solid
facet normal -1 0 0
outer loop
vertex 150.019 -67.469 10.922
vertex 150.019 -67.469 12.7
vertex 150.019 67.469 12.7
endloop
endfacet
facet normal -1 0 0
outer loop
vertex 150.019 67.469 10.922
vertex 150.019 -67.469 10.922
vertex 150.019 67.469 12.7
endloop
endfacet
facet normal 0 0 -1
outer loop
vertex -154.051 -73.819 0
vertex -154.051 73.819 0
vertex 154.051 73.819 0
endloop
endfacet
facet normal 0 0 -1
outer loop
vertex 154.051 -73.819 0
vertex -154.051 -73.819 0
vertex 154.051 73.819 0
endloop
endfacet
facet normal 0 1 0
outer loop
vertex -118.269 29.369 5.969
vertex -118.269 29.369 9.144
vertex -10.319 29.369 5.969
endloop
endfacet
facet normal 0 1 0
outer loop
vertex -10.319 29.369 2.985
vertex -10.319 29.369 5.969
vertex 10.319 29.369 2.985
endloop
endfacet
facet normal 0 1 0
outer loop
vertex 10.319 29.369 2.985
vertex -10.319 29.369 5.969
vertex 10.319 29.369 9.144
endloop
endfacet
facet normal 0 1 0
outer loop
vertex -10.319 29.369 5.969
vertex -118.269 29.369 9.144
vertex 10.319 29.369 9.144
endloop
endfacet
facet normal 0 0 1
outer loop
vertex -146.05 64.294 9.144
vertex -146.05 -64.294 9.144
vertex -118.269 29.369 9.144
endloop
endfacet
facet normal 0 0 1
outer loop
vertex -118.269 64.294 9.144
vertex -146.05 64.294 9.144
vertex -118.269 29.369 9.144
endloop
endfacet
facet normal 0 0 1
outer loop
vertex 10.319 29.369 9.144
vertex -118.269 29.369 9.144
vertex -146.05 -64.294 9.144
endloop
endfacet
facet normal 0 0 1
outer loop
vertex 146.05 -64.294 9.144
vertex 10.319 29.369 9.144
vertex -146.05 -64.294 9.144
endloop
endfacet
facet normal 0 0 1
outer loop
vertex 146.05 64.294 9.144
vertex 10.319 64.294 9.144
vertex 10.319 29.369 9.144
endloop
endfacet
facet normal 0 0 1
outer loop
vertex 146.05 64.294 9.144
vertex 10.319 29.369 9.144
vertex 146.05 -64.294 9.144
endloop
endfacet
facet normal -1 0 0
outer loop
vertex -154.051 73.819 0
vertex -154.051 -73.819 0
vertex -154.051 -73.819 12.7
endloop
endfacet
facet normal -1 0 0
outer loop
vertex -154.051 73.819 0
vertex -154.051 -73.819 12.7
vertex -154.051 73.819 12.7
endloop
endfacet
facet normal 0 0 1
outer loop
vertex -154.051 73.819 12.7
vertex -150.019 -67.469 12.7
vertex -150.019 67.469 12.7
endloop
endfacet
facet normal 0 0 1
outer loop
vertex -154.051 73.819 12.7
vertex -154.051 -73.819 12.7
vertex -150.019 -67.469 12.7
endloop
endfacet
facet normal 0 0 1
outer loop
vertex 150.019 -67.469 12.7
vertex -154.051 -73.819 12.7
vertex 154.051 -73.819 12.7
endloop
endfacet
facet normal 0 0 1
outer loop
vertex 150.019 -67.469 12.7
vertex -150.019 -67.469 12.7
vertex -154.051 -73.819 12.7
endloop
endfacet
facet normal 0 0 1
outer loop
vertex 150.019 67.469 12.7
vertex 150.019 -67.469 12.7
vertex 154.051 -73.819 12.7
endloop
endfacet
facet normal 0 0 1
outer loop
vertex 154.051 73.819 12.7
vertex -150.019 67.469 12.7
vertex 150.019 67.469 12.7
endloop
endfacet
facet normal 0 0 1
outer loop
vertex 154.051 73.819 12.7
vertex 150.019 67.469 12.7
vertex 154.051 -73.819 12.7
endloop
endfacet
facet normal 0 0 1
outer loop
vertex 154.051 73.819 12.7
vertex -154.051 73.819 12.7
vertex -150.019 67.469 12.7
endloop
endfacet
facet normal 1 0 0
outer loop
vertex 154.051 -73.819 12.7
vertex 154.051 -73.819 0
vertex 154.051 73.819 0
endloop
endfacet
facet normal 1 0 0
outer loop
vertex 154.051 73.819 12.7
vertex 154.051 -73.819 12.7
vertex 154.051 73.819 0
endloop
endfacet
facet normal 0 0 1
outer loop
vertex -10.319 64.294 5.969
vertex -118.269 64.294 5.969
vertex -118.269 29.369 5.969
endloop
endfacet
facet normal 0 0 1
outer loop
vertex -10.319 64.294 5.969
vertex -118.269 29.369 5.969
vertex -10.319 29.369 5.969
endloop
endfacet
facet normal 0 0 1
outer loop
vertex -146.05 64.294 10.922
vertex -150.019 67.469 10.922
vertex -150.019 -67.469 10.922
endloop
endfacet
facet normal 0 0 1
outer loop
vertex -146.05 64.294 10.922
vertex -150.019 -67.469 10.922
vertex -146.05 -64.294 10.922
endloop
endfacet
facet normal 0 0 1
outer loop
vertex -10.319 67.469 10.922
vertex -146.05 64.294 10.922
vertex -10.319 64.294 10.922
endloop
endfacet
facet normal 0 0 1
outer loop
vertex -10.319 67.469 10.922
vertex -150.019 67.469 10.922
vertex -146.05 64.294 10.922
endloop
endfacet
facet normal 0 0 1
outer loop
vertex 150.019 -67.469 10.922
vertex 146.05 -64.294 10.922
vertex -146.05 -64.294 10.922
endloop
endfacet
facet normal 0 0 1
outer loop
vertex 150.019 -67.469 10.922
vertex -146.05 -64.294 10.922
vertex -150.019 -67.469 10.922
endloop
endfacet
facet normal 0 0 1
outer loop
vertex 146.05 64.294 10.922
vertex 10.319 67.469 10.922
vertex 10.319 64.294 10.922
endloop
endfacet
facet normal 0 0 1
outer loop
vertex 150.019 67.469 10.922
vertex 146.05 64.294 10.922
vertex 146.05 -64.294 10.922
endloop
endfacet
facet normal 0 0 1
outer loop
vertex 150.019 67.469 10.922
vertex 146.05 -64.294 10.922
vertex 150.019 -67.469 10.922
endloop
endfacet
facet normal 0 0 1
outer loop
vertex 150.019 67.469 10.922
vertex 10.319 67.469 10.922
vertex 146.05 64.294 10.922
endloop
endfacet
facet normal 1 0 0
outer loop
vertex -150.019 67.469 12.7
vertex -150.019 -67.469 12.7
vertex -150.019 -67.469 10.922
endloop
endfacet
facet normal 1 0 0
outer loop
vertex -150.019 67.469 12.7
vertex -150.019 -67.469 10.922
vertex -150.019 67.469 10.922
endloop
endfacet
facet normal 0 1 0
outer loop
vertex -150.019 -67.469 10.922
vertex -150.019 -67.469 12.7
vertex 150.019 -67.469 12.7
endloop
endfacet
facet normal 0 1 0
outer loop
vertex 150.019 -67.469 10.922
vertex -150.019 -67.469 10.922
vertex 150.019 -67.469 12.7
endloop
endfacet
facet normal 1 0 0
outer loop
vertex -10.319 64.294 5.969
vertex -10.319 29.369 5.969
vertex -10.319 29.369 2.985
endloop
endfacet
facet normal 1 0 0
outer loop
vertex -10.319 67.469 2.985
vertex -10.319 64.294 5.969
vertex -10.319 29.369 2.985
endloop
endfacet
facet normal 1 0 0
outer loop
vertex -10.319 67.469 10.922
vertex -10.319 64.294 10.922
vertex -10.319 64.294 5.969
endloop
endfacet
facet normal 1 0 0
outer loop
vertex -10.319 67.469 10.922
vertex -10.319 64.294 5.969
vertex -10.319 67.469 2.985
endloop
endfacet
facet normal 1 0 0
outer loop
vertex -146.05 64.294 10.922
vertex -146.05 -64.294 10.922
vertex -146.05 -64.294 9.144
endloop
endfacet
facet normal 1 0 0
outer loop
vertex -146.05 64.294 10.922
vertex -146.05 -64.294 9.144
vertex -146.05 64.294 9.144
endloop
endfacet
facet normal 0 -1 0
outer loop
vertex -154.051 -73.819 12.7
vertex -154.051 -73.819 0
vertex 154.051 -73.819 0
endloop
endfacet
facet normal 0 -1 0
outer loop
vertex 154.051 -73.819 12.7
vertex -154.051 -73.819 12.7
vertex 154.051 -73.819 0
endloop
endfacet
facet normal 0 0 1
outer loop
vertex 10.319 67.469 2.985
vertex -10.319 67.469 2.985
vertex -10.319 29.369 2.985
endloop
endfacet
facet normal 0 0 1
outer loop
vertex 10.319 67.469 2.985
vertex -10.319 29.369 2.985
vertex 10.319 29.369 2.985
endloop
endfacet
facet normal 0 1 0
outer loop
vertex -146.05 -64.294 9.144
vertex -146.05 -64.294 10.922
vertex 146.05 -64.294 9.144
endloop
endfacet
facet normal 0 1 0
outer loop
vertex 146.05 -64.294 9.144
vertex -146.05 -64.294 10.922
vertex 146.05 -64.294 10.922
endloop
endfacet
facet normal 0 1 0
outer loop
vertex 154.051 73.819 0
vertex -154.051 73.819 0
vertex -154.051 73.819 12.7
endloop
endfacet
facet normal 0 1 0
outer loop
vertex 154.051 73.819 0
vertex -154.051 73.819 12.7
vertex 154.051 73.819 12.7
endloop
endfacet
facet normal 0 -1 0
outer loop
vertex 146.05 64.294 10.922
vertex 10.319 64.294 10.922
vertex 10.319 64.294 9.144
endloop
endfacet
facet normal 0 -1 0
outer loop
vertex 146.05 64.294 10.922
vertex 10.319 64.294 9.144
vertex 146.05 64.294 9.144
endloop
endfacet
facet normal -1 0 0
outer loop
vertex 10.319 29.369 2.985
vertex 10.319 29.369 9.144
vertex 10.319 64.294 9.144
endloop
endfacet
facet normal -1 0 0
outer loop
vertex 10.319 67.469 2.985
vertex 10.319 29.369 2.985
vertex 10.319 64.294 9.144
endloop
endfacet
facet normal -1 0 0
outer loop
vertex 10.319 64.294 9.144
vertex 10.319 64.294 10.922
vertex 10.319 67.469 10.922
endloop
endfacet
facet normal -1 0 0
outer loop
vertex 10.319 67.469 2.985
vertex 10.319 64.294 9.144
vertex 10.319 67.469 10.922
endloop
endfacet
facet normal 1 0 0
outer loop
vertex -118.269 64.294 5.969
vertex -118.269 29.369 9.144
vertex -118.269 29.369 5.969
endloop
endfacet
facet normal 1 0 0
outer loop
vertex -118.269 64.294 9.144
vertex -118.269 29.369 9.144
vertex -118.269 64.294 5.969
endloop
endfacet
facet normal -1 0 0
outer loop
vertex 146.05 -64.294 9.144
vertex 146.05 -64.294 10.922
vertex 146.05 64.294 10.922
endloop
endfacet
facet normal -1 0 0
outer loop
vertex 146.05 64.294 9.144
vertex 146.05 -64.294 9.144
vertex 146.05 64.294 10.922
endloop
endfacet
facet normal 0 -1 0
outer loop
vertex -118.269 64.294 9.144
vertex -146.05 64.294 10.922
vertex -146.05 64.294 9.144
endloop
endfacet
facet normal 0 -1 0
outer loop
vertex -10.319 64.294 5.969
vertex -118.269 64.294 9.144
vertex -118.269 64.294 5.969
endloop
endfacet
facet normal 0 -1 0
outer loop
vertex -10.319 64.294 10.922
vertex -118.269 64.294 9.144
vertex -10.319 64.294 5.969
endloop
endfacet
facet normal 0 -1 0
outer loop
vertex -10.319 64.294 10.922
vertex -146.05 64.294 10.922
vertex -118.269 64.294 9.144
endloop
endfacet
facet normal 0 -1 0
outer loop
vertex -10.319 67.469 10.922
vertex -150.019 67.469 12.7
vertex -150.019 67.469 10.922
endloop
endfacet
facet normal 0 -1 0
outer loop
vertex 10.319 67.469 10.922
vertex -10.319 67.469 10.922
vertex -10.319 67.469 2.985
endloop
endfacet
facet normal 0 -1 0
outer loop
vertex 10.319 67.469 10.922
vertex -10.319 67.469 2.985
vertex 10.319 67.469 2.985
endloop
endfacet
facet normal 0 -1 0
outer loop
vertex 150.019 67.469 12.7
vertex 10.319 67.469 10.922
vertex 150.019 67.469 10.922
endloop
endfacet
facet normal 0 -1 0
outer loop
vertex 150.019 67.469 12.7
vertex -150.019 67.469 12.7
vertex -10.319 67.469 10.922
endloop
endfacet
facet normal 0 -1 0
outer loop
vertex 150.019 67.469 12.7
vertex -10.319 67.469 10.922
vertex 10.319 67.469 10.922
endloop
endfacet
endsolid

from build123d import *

# Parameters (mm, degrees)
SKETCH001_W     = 308.102
SKETCH001_H     = 147.6375
PAD_DEPTH       = 12.7
SKETCH002_W     = 292.1
SKETCH002_H     = 128.5875
POCKET_DEPTH    = 3.556
SKETCH_W        = 300.0375
SKETCH_H        = 134.9375
POCKET001_DEPTH = 1.778
SKETCH003_W     = 20.6375
SKETCH003_H     = 38.1
POCKET002_DEPTH = 7.9375
SKETCH004_W     = 107.95
SKETCH004_H     = 34.925
POCKET003_DEPTH = 3.175


with BuildPart() as part:
    # Sketch001 → Pad (new body)
    with BuildSketch(Plane.XY):
        Rectangle(SKETCH001_W, SKETCH001_H)
    extrude(amount=PAD_DEPTH)

    # Sketch002 → Pocket (cut)
    with BuildSketch(Plane.XY.offset(12.7)):
        Rectangle(SKETCH002_W, SKETCH002_H)
    extrude(amount=-POCKET_DEPTH, mode=Mode.SUBTRACT)

    # Sketch → Pocket001 (cut)
    with BuildSketch(Plane.XY.offset(12.7)):
        Rectangle(SKETCH_W, SKETCH_H)
    extrude(amount=-POCKET001_DEPTH, mode=Mode.SUBTRACT)

    # Sketch003 → Pocket002 (cut)
    with BuildSketch(Plane.XY.offset(10.922)):
        with Locations((0, 48.41875)):
            Rectangle(SKETCH003_W, SKETCH003_H)
    extrude(amount=-POCKET002_DEPTH, mode=Mode.SUBTRACT)

    # Sketch004 → Pocket003 (cut)
    with BuildSketch(Plane.XY.offset(9.144)):
        with Locations((-64.29375, 46.83125)):
            Rectangle(SKETCH004_W, SKETCH004_H)
    extrude(amount=-POCKET003_DEPTH, mode=Mode.SUBTRACT)


solid = part.part
